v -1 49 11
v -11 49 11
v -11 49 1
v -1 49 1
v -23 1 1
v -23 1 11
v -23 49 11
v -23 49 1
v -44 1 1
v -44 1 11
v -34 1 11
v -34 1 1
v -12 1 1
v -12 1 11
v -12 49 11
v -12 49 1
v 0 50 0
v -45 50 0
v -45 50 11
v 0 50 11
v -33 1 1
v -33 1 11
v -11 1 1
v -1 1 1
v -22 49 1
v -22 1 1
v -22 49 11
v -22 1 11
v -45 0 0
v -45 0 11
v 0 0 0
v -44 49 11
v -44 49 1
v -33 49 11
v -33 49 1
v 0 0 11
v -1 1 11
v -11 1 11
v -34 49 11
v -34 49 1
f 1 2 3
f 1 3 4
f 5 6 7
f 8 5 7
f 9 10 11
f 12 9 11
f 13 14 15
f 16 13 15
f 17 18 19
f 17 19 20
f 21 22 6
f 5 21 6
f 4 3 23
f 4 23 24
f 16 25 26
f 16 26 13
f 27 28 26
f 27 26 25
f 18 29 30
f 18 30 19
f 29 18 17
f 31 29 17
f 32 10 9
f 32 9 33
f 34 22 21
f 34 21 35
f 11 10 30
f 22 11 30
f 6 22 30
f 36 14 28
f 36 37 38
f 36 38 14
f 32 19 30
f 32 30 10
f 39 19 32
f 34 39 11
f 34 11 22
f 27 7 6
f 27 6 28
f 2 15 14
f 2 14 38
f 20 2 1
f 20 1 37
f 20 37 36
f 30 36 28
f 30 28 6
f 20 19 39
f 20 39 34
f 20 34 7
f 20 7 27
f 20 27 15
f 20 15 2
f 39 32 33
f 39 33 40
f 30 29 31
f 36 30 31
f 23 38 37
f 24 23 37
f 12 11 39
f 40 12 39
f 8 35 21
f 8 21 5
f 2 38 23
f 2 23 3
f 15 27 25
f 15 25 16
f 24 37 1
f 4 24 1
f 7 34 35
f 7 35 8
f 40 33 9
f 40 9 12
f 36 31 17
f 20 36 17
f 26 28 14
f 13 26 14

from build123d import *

# Parameters (mm, degrees)
ESQUISSE1_W             = 45
ESQUISSE1_H             = 50
EXTRUSION1_DEPTH        = 11
ESQUISSE2_W             = 10
ESQUISSE2_H             = 48
ENL_V_MAT_EXTRU_1_DEPTH = 10


with BuildPart() as part:
    # Esquisse1 → Extrusion1 (new body)
    with BuildSketch(Plane.XY):
        with Locations((-22.5, 25)):
            Rectangle(ESQUISSE1_W, ESQUISSE1_H)
    extrude(amount=EXTRUSION1_DEPTH)

    # Esquisse2 → Enlèv. mat.-Extru.1 (cut)
    with BuildSketch(Plane.XY.offset(11)):
        with Locations((-39, 25)):
            Rectangle(ESQUISSE2_W, ESQUISSE2_H)
        with Locations((-28, 25)):
            Rectangle(ESQUISSE2_W, ESQUISSE2_H)
        with Locations((-17, 25)):
            Rectangle(ESQUISSE2_W, ESQUISSE2_H)
        with Locations((-6, 25)):
            Rectangle(ESQUISSE2_W, ESQUISSE2_H)
    extrude(amount=-ENL_V_MAT_EXTRU_1_DEPTH, mode=Mode.SUBTRACT)


solid = part.part
